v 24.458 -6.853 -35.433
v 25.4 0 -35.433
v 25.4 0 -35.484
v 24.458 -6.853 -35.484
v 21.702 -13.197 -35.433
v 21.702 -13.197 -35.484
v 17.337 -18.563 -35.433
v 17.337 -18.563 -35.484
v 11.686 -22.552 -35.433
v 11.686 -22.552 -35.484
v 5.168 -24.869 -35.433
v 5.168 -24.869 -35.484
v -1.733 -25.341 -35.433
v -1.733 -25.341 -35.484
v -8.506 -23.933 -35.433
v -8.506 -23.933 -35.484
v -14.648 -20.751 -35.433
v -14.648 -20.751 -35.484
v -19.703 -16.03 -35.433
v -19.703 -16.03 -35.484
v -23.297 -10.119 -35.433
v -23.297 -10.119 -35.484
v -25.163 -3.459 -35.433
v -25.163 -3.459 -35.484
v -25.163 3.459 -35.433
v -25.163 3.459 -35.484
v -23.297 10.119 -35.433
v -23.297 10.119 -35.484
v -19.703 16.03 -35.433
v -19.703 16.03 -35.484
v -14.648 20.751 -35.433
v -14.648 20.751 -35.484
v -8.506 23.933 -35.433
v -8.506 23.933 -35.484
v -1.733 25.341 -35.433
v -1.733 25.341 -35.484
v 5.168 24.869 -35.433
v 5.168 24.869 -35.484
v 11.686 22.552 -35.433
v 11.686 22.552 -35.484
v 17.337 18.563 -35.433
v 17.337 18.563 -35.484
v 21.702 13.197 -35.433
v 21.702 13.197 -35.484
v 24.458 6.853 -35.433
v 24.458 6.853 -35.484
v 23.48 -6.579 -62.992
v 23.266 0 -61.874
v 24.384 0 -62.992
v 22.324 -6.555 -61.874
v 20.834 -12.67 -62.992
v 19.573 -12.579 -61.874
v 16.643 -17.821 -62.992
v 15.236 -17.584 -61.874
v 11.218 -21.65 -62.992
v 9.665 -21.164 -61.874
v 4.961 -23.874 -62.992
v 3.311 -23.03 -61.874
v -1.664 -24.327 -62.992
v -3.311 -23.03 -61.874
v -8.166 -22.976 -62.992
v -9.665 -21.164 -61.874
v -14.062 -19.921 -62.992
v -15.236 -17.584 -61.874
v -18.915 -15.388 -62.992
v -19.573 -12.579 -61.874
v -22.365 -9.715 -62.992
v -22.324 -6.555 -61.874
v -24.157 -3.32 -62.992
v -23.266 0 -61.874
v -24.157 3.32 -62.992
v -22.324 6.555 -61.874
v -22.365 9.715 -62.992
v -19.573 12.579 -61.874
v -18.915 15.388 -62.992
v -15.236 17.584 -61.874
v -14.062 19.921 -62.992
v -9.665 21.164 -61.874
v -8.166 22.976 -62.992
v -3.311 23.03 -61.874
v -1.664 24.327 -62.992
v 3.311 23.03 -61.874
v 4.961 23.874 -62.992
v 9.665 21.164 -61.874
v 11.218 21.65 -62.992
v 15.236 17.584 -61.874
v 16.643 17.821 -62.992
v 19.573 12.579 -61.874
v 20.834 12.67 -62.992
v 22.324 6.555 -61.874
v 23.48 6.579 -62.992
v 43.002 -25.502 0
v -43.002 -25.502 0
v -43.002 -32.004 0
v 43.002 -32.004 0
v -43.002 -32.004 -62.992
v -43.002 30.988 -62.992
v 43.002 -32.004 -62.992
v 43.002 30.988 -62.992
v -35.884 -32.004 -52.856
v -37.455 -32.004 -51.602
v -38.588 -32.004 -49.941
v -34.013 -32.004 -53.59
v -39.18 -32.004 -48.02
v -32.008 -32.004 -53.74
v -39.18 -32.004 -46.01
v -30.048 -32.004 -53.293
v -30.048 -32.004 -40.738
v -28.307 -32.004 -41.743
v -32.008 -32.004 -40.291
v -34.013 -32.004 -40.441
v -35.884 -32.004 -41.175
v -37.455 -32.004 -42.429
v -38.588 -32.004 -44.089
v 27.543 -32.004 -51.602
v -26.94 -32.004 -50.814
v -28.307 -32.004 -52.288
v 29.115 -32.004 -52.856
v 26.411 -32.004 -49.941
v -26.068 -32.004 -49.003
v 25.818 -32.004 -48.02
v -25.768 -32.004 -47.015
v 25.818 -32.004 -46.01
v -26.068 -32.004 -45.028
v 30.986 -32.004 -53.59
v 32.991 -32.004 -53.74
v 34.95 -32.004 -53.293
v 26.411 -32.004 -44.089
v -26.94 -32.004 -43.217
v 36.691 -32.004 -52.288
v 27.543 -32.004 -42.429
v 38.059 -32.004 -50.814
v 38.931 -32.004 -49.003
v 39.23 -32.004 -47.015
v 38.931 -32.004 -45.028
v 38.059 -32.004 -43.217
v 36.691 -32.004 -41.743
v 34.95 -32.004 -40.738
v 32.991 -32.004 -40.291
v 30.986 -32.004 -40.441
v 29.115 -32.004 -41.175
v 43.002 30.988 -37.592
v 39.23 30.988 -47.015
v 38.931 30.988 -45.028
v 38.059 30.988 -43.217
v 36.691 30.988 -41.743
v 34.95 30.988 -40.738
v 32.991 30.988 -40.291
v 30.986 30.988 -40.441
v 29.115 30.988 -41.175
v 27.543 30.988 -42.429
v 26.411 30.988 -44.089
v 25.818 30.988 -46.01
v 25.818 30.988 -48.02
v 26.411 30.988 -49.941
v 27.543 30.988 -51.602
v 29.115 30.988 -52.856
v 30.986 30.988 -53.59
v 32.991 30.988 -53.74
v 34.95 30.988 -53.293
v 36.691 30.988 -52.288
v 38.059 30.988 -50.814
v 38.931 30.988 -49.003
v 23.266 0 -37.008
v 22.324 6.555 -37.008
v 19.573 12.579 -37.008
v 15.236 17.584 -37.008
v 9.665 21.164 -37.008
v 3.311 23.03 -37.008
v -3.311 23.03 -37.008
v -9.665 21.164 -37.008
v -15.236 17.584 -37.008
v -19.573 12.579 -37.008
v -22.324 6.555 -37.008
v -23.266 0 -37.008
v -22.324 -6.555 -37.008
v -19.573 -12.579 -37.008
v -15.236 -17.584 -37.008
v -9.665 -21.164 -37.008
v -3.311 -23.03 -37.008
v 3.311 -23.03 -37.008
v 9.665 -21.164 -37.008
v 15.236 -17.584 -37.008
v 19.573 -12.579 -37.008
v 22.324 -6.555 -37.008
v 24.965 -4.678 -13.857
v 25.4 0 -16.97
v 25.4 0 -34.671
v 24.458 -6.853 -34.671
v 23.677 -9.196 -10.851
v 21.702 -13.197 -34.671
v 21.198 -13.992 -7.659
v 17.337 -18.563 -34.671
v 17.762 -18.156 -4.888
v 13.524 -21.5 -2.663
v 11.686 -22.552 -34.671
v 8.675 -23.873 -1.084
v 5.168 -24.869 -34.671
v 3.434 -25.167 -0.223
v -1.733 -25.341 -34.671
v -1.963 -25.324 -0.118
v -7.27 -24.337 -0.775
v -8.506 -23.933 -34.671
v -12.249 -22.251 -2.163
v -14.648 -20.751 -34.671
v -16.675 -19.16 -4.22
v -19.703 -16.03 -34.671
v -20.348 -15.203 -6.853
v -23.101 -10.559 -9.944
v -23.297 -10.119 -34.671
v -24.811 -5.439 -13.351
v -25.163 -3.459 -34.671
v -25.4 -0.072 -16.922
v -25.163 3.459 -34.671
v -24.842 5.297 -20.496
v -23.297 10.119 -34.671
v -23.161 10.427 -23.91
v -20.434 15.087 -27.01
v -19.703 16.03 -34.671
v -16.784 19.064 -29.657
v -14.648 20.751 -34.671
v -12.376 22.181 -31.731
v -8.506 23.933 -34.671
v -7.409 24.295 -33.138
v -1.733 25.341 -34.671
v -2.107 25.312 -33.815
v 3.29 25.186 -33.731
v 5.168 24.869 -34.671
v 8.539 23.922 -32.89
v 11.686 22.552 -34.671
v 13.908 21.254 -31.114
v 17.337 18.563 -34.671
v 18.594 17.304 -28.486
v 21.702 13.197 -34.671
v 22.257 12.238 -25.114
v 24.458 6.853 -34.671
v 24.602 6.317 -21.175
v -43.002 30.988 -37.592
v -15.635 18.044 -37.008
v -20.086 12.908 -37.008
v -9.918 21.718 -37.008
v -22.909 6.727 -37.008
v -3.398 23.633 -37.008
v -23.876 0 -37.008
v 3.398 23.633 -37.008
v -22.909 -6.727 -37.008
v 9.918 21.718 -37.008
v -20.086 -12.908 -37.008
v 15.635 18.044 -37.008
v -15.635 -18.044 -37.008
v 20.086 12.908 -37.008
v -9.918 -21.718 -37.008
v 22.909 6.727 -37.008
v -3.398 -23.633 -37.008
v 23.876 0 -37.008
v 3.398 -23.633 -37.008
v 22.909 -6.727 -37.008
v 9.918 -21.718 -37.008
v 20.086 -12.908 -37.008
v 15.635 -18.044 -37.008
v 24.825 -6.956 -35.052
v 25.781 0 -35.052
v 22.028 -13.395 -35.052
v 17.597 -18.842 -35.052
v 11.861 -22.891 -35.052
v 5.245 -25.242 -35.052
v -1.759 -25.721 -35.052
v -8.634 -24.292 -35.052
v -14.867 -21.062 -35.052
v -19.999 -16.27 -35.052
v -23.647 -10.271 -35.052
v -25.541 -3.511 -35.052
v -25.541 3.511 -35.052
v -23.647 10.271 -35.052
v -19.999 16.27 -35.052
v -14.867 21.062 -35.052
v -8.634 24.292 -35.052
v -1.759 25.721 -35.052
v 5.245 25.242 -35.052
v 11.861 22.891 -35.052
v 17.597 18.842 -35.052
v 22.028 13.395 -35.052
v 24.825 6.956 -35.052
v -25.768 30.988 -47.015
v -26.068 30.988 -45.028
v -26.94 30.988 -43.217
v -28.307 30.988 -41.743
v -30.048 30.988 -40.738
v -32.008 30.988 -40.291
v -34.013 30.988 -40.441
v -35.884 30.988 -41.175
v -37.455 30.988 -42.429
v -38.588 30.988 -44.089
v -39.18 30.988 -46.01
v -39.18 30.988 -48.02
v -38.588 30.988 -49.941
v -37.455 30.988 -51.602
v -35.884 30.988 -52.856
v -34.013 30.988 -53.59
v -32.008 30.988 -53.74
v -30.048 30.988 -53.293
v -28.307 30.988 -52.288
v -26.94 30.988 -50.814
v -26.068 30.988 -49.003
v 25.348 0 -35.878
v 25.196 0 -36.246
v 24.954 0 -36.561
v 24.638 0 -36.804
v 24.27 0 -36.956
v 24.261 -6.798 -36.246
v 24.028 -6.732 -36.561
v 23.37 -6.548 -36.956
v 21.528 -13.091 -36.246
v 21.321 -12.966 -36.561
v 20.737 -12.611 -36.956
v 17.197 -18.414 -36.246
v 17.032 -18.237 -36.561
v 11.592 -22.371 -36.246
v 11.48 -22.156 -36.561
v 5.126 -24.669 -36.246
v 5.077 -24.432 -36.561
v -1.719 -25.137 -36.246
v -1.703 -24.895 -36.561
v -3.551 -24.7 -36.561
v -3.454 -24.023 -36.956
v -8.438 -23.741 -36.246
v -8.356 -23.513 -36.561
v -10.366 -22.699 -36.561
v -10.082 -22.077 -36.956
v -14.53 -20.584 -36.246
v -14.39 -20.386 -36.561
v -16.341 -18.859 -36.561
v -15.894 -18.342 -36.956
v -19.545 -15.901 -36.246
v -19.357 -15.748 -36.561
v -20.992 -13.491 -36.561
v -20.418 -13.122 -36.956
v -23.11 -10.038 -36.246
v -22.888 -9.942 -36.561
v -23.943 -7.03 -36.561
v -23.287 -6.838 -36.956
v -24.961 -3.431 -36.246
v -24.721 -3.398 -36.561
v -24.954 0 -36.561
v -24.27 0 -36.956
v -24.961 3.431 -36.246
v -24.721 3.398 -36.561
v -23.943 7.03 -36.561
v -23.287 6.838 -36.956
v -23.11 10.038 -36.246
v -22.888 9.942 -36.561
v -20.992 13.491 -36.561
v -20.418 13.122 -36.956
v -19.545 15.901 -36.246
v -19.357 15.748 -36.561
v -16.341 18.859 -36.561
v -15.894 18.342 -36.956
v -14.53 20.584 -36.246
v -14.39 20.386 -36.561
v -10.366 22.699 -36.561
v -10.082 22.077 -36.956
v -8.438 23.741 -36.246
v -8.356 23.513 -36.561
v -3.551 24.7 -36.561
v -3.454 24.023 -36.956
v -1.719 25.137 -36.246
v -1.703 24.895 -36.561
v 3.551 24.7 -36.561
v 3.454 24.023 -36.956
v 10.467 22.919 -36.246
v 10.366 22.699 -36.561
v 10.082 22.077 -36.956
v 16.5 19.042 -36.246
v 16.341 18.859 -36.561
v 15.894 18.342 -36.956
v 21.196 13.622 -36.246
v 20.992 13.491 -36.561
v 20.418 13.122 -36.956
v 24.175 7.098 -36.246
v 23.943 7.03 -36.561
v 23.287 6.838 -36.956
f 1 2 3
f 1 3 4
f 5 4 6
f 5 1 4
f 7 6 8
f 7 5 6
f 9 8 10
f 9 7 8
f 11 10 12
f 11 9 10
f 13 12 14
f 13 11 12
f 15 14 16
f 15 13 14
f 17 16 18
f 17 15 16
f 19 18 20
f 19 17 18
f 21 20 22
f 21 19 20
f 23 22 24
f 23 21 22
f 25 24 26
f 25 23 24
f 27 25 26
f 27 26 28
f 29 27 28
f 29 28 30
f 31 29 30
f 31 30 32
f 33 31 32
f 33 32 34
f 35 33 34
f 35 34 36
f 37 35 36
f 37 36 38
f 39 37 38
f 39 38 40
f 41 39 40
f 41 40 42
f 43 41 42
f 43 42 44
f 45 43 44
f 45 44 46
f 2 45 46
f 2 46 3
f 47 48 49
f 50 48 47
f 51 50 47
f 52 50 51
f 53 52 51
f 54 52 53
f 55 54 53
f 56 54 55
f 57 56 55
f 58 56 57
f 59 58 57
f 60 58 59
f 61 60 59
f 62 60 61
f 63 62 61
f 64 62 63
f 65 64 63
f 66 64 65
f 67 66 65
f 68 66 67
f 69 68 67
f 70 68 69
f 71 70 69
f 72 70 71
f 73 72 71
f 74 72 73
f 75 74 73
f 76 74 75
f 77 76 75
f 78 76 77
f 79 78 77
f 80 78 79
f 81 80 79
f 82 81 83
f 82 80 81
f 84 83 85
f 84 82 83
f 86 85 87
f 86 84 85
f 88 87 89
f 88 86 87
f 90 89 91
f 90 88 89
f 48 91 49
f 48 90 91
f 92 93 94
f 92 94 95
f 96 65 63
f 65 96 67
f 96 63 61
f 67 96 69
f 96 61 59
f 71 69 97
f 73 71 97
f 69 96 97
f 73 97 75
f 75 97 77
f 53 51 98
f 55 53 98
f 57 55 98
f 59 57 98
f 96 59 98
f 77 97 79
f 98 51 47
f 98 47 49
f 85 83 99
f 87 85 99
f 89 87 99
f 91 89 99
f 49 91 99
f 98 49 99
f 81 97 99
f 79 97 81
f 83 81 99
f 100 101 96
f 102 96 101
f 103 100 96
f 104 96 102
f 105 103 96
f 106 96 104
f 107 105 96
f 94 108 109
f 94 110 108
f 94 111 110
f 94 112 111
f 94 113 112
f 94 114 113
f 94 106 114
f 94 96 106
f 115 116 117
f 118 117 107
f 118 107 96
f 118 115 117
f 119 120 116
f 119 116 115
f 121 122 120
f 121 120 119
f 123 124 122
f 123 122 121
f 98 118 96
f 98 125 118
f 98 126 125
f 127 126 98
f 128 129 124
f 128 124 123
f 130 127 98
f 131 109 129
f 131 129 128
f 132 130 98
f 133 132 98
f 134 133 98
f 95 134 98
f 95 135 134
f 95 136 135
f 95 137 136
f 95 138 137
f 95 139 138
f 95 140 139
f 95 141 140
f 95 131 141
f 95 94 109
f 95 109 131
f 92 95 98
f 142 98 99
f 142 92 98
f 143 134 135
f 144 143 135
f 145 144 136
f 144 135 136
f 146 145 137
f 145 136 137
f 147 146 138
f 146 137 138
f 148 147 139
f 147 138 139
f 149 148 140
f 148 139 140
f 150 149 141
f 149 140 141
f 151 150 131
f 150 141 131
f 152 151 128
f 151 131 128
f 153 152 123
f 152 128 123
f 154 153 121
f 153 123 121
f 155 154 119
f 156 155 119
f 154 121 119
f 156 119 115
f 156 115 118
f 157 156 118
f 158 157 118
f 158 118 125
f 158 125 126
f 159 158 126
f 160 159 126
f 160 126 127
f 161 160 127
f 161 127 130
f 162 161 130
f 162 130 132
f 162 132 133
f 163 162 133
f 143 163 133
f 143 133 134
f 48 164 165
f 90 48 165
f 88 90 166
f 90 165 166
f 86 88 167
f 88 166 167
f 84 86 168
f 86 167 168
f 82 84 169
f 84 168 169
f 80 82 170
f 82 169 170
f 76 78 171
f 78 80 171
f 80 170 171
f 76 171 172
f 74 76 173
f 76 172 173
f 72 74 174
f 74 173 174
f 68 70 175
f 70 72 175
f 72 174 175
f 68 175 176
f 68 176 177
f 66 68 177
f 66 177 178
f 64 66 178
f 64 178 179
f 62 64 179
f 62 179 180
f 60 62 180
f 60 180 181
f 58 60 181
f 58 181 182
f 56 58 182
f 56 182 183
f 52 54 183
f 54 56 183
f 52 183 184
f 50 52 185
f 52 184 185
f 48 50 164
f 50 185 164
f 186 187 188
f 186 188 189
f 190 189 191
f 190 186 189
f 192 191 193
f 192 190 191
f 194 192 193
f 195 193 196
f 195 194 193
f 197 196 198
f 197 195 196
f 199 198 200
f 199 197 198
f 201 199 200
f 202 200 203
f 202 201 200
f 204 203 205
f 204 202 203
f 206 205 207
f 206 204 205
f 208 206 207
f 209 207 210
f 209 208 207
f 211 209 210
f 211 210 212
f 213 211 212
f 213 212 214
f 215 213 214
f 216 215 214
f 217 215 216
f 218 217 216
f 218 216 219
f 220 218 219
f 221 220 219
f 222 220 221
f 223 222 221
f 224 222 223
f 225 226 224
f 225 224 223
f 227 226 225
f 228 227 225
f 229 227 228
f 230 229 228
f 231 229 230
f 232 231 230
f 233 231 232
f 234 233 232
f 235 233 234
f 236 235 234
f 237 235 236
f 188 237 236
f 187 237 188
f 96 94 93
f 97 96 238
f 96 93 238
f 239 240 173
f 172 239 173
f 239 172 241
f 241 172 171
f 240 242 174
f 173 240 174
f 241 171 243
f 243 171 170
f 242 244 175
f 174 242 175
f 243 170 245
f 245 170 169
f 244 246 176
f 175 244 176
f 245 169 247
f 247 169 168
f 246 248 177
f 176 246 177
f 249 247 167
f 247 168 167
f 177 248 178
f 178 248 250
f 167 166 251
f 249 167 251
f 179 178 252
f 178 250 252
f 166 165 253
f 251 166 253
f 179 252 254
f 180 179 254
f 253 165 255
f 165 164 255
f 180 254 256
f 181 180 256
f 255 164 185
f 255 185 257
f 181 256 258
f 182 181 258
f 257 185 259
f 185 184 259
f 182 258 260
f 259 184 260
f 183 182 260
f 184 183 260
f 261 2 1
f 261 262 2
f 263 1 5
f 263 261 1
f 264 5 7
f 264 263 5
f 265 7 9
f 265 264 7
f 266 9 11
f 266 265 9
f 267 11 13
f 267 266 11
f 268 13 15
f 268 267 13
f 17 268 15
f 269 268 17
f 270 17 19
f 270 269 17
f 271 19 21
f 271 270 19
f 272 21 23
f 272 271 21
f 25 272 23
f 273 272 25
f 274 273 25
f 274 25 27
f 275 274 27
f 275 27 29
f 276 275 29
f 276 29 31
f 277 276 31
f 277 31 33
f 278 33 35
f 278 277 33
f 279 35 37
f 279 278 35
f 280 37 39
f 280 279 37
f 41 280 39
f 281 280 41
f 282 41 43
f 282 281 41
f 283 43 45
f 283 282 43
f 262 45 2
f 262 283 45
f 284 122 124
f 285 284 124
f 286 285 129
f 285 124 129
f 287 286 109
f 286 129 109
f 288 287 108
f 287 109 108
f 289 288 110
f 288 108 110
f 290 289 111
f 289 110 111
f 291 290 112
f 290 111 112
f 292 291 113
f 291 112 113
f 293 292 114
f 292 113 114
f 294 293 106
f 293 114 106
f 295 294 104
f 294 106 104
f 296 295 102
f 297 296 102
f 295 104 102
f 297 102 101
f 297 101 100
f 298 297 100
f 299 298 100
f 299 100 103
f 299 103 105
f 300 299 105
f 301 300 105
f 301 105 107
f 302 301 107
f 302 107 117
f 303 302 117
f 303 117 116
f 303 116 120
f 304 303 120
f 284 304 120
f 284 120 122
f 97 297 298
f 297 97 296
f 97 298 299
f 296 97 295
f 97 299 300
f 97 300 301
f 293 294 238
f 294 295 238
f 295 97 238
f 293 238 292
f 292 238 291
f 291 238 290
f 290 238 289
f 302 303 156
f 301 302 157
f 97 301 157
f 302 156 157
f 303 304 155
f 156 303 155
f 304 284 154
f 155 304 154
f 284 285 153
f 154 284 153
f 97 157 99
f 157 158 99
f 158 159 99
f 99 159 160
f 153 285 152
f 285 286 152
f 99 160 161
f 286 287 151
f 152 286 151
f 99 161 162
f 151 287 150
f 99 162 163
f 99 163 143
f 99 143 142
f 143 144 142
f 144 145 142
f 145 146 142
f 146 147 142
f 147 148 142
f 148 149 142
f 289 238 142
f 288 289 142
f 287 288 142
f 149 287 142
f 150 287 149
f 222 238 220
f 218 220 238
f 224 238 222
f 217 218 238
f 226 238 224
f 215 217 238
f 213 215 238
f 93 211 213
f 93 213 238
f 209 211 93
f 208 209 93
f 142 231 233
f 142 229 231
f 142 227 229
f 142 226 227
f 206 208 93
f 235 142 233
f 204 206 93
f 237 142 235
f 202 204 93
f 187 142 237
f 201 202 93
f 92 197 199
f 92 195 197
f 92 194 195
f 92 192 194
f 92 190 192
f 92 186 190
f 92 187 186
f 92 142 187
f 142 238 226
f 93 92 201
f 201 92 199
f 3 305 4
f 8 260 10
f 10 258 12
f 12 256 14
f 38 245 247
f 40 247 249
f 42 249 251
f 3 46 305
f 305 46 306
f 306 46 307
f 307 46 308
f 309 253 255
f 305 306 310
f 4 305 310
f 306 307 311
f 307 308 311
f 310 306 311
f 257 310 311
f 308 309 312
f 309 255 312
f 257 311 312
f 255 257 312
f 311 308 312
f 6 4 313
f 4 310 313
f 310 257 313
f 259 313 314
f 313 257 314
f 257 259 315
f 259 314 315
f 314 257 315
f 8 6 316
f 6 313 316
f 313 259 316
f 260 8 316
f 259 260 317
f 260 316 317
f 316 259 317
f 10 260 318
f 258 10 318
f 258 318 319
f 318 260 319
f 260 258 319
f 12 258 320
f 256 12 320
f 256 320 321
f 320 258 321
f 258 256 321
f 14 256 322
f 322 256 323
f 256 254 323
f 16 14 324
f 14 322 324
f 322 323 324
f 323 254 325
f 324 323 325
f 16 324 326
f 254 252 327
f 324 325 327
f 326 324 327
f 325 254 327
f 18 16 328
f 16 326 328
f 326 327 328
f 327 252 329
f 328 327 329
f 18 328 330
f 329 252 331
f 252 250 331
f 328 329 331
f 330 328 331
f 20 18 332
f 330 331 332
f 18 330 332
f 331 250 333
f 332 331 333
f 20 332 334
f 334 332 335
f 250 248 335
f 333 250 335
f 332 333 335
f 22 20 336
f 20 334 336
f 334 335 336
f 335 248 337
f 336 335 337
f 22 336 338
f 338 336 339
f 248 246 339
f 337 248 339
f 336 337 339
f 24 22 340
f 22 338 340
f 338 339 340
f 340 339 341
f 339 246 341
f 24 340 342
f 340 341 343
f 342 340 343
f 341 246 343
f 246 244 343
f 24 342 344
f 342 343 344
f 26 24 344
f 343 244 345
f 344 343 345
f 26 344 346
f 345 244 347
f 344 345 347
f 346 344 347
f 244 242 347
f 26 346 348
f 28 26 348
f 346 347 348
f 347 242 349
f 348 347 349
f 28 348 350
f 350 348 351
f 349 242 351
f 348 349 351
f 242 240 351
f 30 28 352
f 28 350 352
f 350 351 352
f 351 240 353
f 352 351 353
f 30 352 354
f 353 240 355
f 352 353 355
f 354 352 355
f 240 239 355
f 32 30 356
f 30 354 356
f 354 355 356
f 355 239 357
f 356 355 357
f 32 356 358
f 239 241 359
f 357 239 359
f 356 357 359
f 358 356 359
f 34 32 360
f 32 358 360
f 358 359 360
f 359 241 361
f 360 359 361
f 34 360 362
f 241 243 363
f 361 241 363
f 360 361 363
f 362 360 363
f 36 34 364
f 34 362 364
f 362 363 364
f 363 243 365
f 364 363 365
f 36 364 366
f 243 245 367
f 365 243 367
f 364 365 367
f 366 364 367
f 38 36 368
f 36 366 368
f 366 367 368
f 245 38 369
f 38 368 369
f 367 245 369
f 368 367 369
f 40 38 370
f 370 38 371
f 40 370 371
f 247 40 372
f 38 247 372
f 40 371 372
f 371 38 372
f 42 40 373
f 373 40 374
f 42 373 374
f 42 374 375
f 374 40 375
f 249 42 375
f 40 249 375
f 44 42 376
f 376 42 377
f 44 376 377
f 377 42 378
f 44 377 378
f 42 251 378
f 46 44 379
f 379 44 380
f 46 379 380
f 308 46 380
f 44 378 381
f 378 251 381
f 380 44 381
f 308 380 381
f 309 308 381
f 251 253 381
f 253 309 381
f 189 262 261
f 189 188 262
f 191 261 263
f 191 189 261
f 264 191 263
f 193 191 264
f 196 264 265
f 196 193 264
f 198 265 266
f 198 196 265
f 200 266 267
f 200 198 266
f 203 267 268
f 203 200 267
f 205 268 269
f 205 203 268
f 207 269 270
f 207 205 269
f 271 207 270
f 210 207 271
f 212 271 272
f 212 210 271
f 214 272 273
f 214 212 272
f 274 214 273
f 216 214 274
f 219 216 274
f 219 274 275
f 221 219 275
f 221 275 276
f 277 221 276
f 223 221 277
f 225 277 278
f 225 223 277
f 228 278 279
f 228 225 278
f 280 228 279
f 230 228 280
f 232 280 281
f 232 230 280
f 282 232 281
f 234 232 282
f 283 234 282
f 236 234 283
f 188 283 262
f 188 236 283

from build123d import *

# Parameters (mm, degrees)
SKETCH1_W          = 86.0044
SKETCH1_H          = 62.992
SKETCH1_R          = 23.2665
EXTRUDE1_DEPTH     = 62.992
CUT_EXTRUDE1_DEPTH = 87.0044
SKETCH3_R          = 25.4
CUT_EXTRUDE2_DEPTH = 37.0078
FILLET1_R          = 1.524
HOLE1_D            = 13.4874
HOLE1_DEPTH        = 62.992


with BuildPart() as part:
    # Sketch1 → Extrude1 (new body)
    with BuildSketch(Plane.XY):
        with Locations((0, -0.508)):
            Rectangle(SKETCH1_W, SKETCH1_H)
        Circle(SKETCH1_R, mode=Mode.SUBTRACT)
    extrude(amount=-EXTRUDE1_DEPTH)

    # Sketch2 → Cut-Extrude1 (cut, through all)
    with BuildSketch(Plane(origin=(43.0022, 0, 0), x_dir=(0, 0, -1), z_dir=(1, 0, 0))):
        Polygon((0, 30.988), (37.592, 30.988), (0, -25.5016), align=None)
    extrude(amount=-CUT_EXTRUDE1_DEPTH, mode=Mode.SUBTRACT)

    # Sketch3 → Cut-Extrude2 (cut)
    with BuildSketch(Plane(origin=(0, 0, 0), x_dir=(-1, 0, 0), z_dir=(0, 0, -1))):
        with Locations(Location((0, 0, 0), (0, 0, 180))):  # turned: the seam where the file's is
            Circle(SKETCH3_R)
    extrude(amount=CUT_EXTRUDE2_DEPTH, mode=Mode.SUBTRACT)

    # Fillet1
    fillet1_edges = [part.edges().sort_by_distance(p)[0] for p in [
        (-25.4, 0, -37.0078),
    ]]
    fillet(fillet1_edges, radius=FILLET1_R)

    # Hole1
    with Locations(Plane(origin=(0, 30.988, 0), x_dir=(-1, 0, 0), z_dir=(0, 1, 0))):
        with Locations((32.512, -47.0154), (-32.4866, -47.0154)):
            Hole(HOLE1_D / 2, depth=HOLE1_DEPTH)

    # Sketch6 → Cut-Revolve1 (revolve, cut)
    with BuildSketch(Plane(origin=(0, 0, 0), x_dir=(-1, 0, 0), z_dir=(0, 1, 0)), mode=Mode.PRIVATE) as cut_revolve1_sk:
        Polygon((25.4, -34.671), (25.4, -35.433), (25.781, -35.052), align=None)
        Polygon((23.2665, -61.8745), (23.2665, -62.992), (24.384, -62.992), align=None)
    revolve(cut_revolve1_sk.sketch.rotate(Axis((0, 0, 17.508123997), (0, 0, -1)), 180), axis=Axis((0, 0, 17.508123997), (0, 0, -1)), mode=Mode.SUBTRACT)  # turned: the seam where the file's is


solid = part.part
